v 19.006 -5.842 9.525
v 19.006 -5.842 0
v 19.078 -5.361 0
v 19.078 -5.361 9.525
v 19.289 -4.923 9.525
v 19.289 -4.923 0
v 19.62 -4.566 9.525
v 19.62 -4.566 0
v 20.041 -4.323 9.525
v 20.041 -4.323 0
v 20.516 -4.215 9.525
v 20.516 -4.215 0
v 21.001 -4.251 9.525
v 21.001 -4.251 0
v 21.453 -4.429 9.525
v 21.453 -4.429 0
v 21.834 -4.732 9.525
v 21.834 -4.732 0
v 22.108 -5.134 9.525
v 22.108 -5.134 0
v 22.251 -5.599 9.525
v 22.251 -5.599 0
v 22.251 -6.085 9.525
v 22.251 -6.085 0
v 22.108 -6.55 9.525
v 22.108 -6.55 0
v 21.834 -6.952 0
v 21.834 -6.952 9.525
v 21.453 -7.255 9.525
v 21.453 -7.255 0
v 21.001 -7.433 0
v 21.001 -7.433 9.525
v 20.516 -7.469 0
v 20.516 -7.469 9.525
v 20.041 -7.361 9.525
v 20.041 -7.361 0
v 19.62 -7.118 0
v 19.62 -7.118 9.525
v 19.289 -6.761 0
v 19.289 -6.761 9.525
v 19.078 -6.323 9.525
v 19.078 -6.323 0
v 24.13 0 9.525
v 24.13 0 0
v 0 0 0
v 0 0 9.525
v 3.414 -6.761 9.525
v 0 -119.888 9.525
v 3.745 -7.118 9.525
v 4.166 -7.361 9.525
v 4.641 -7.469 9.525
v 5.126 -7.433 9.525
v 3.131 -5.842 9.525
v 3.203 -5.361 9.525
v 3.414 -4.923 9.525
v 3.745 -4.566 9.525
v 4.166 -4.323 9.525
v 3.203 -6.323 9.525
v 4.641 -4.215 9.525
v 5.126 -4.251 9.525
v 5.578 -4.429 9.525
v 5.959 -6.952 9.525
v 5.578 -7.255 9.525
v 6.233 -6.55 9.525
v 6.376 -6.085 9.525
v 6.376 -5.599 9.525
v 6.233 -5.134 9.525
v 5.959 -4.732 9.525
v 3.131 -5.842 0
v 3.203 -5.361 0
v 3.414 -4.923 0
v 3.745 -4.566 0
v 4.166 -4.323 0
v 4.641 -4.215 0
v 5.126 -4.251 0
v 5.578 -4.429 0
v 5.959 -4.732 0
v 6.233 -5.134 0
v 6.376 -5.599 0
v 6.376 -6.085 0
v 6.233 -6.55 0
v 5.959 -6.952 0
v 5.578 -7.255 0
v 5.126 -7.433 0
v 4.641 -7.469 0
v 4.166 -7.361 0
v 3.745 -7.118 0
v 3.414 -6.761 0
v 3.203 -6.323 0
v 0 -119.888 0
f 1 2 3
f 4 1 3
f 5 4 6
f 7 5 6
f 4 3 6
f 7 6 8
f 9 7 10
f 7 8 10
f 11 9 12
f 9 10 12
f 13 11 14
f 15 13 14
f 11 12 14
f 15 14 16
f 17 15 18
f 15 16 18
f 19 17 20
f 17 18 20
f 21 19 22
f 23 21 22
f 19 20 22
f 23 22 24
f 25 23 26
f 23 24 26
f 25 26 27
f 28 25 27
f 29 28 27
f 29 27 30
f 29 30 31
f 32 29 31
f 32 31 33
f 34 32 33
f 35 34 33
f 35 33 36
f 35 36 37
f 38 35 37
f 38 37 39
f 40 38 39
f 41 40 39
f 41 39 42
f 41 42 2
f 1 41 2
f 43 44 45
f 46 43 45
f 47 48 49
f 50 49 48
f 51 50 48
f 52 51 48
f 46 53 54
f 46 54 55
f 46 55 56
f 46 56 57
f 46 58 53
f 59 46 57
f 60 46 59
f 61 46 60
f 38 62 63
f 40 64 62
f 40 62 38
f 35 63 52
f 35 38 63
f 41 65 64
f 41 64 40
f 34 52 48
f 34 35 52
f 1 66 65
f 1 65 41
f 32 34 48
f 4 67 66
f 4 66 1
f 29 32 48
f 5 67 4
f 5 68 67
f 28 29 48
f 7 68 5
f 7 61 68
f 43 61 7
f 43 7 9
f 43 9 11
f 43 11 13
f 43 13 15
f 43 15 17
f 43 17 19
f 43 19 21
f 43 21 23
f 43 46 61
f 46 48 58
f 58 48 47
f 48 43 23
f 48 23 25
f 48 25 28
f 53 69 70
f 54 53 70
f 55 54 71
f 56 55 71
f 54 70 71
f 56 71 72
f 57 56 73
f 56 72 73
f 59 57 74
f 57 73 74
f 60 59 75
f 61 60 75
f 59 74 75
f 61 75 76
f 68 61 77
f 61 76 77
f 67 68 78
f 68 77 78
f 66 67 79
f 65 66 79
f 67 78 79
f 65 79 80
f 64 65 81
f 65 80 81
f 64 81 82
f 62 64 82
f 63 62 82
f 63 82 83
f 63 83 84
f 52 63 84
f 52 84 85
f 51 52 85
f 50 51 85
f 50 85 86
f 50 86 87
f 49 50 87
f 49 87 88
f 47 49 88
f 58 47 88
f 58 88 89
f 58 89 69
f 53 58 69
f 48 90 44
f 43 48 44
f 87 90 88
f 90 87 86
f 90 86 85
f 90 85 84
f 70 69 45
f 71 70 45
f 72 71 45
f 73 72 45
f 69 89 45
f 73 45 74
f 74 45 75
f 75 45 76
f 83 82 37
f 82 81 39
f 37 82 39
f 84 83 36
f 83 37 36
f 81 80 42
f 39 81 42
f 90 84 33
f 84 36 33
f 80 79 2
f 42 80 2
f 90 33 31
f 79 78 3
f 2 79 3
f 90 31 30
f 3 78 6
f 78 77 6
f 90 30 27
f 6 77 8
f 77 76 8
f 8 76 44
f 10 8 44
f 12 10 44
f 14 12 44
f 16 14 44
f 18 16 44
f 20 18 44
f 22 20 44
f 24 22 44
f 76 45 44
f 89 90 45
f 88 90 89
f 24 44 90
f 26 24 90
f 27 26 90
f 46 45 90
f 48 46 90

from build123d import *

# Parameters (mm, degrees)
BOSS_EXTRUDE1_DEPTH   = 9.525
F_4_CLEARANCE_HOLE1_D = 3.2639


with BuildPart() as part:
    # Sketch1 → Boss-Extrude1 (new body)
    with BuildSketch(Plane.XY):
        Polygon((0, 0), (0, -119.888), (24.13, 0), align=None)
    extrude(amount=BOSS_EXTRUDE1_DEPTH)

    # #4 Clearance Hole1 (through all)
    with Locations(Plane.XY.offset(9.525)):
        with Locations((20.6375, -5.842), (4.7625, -5.842)):
            Hole(F_4_CLEARANCE_HOLE1_D / 2)


solid = part.part
